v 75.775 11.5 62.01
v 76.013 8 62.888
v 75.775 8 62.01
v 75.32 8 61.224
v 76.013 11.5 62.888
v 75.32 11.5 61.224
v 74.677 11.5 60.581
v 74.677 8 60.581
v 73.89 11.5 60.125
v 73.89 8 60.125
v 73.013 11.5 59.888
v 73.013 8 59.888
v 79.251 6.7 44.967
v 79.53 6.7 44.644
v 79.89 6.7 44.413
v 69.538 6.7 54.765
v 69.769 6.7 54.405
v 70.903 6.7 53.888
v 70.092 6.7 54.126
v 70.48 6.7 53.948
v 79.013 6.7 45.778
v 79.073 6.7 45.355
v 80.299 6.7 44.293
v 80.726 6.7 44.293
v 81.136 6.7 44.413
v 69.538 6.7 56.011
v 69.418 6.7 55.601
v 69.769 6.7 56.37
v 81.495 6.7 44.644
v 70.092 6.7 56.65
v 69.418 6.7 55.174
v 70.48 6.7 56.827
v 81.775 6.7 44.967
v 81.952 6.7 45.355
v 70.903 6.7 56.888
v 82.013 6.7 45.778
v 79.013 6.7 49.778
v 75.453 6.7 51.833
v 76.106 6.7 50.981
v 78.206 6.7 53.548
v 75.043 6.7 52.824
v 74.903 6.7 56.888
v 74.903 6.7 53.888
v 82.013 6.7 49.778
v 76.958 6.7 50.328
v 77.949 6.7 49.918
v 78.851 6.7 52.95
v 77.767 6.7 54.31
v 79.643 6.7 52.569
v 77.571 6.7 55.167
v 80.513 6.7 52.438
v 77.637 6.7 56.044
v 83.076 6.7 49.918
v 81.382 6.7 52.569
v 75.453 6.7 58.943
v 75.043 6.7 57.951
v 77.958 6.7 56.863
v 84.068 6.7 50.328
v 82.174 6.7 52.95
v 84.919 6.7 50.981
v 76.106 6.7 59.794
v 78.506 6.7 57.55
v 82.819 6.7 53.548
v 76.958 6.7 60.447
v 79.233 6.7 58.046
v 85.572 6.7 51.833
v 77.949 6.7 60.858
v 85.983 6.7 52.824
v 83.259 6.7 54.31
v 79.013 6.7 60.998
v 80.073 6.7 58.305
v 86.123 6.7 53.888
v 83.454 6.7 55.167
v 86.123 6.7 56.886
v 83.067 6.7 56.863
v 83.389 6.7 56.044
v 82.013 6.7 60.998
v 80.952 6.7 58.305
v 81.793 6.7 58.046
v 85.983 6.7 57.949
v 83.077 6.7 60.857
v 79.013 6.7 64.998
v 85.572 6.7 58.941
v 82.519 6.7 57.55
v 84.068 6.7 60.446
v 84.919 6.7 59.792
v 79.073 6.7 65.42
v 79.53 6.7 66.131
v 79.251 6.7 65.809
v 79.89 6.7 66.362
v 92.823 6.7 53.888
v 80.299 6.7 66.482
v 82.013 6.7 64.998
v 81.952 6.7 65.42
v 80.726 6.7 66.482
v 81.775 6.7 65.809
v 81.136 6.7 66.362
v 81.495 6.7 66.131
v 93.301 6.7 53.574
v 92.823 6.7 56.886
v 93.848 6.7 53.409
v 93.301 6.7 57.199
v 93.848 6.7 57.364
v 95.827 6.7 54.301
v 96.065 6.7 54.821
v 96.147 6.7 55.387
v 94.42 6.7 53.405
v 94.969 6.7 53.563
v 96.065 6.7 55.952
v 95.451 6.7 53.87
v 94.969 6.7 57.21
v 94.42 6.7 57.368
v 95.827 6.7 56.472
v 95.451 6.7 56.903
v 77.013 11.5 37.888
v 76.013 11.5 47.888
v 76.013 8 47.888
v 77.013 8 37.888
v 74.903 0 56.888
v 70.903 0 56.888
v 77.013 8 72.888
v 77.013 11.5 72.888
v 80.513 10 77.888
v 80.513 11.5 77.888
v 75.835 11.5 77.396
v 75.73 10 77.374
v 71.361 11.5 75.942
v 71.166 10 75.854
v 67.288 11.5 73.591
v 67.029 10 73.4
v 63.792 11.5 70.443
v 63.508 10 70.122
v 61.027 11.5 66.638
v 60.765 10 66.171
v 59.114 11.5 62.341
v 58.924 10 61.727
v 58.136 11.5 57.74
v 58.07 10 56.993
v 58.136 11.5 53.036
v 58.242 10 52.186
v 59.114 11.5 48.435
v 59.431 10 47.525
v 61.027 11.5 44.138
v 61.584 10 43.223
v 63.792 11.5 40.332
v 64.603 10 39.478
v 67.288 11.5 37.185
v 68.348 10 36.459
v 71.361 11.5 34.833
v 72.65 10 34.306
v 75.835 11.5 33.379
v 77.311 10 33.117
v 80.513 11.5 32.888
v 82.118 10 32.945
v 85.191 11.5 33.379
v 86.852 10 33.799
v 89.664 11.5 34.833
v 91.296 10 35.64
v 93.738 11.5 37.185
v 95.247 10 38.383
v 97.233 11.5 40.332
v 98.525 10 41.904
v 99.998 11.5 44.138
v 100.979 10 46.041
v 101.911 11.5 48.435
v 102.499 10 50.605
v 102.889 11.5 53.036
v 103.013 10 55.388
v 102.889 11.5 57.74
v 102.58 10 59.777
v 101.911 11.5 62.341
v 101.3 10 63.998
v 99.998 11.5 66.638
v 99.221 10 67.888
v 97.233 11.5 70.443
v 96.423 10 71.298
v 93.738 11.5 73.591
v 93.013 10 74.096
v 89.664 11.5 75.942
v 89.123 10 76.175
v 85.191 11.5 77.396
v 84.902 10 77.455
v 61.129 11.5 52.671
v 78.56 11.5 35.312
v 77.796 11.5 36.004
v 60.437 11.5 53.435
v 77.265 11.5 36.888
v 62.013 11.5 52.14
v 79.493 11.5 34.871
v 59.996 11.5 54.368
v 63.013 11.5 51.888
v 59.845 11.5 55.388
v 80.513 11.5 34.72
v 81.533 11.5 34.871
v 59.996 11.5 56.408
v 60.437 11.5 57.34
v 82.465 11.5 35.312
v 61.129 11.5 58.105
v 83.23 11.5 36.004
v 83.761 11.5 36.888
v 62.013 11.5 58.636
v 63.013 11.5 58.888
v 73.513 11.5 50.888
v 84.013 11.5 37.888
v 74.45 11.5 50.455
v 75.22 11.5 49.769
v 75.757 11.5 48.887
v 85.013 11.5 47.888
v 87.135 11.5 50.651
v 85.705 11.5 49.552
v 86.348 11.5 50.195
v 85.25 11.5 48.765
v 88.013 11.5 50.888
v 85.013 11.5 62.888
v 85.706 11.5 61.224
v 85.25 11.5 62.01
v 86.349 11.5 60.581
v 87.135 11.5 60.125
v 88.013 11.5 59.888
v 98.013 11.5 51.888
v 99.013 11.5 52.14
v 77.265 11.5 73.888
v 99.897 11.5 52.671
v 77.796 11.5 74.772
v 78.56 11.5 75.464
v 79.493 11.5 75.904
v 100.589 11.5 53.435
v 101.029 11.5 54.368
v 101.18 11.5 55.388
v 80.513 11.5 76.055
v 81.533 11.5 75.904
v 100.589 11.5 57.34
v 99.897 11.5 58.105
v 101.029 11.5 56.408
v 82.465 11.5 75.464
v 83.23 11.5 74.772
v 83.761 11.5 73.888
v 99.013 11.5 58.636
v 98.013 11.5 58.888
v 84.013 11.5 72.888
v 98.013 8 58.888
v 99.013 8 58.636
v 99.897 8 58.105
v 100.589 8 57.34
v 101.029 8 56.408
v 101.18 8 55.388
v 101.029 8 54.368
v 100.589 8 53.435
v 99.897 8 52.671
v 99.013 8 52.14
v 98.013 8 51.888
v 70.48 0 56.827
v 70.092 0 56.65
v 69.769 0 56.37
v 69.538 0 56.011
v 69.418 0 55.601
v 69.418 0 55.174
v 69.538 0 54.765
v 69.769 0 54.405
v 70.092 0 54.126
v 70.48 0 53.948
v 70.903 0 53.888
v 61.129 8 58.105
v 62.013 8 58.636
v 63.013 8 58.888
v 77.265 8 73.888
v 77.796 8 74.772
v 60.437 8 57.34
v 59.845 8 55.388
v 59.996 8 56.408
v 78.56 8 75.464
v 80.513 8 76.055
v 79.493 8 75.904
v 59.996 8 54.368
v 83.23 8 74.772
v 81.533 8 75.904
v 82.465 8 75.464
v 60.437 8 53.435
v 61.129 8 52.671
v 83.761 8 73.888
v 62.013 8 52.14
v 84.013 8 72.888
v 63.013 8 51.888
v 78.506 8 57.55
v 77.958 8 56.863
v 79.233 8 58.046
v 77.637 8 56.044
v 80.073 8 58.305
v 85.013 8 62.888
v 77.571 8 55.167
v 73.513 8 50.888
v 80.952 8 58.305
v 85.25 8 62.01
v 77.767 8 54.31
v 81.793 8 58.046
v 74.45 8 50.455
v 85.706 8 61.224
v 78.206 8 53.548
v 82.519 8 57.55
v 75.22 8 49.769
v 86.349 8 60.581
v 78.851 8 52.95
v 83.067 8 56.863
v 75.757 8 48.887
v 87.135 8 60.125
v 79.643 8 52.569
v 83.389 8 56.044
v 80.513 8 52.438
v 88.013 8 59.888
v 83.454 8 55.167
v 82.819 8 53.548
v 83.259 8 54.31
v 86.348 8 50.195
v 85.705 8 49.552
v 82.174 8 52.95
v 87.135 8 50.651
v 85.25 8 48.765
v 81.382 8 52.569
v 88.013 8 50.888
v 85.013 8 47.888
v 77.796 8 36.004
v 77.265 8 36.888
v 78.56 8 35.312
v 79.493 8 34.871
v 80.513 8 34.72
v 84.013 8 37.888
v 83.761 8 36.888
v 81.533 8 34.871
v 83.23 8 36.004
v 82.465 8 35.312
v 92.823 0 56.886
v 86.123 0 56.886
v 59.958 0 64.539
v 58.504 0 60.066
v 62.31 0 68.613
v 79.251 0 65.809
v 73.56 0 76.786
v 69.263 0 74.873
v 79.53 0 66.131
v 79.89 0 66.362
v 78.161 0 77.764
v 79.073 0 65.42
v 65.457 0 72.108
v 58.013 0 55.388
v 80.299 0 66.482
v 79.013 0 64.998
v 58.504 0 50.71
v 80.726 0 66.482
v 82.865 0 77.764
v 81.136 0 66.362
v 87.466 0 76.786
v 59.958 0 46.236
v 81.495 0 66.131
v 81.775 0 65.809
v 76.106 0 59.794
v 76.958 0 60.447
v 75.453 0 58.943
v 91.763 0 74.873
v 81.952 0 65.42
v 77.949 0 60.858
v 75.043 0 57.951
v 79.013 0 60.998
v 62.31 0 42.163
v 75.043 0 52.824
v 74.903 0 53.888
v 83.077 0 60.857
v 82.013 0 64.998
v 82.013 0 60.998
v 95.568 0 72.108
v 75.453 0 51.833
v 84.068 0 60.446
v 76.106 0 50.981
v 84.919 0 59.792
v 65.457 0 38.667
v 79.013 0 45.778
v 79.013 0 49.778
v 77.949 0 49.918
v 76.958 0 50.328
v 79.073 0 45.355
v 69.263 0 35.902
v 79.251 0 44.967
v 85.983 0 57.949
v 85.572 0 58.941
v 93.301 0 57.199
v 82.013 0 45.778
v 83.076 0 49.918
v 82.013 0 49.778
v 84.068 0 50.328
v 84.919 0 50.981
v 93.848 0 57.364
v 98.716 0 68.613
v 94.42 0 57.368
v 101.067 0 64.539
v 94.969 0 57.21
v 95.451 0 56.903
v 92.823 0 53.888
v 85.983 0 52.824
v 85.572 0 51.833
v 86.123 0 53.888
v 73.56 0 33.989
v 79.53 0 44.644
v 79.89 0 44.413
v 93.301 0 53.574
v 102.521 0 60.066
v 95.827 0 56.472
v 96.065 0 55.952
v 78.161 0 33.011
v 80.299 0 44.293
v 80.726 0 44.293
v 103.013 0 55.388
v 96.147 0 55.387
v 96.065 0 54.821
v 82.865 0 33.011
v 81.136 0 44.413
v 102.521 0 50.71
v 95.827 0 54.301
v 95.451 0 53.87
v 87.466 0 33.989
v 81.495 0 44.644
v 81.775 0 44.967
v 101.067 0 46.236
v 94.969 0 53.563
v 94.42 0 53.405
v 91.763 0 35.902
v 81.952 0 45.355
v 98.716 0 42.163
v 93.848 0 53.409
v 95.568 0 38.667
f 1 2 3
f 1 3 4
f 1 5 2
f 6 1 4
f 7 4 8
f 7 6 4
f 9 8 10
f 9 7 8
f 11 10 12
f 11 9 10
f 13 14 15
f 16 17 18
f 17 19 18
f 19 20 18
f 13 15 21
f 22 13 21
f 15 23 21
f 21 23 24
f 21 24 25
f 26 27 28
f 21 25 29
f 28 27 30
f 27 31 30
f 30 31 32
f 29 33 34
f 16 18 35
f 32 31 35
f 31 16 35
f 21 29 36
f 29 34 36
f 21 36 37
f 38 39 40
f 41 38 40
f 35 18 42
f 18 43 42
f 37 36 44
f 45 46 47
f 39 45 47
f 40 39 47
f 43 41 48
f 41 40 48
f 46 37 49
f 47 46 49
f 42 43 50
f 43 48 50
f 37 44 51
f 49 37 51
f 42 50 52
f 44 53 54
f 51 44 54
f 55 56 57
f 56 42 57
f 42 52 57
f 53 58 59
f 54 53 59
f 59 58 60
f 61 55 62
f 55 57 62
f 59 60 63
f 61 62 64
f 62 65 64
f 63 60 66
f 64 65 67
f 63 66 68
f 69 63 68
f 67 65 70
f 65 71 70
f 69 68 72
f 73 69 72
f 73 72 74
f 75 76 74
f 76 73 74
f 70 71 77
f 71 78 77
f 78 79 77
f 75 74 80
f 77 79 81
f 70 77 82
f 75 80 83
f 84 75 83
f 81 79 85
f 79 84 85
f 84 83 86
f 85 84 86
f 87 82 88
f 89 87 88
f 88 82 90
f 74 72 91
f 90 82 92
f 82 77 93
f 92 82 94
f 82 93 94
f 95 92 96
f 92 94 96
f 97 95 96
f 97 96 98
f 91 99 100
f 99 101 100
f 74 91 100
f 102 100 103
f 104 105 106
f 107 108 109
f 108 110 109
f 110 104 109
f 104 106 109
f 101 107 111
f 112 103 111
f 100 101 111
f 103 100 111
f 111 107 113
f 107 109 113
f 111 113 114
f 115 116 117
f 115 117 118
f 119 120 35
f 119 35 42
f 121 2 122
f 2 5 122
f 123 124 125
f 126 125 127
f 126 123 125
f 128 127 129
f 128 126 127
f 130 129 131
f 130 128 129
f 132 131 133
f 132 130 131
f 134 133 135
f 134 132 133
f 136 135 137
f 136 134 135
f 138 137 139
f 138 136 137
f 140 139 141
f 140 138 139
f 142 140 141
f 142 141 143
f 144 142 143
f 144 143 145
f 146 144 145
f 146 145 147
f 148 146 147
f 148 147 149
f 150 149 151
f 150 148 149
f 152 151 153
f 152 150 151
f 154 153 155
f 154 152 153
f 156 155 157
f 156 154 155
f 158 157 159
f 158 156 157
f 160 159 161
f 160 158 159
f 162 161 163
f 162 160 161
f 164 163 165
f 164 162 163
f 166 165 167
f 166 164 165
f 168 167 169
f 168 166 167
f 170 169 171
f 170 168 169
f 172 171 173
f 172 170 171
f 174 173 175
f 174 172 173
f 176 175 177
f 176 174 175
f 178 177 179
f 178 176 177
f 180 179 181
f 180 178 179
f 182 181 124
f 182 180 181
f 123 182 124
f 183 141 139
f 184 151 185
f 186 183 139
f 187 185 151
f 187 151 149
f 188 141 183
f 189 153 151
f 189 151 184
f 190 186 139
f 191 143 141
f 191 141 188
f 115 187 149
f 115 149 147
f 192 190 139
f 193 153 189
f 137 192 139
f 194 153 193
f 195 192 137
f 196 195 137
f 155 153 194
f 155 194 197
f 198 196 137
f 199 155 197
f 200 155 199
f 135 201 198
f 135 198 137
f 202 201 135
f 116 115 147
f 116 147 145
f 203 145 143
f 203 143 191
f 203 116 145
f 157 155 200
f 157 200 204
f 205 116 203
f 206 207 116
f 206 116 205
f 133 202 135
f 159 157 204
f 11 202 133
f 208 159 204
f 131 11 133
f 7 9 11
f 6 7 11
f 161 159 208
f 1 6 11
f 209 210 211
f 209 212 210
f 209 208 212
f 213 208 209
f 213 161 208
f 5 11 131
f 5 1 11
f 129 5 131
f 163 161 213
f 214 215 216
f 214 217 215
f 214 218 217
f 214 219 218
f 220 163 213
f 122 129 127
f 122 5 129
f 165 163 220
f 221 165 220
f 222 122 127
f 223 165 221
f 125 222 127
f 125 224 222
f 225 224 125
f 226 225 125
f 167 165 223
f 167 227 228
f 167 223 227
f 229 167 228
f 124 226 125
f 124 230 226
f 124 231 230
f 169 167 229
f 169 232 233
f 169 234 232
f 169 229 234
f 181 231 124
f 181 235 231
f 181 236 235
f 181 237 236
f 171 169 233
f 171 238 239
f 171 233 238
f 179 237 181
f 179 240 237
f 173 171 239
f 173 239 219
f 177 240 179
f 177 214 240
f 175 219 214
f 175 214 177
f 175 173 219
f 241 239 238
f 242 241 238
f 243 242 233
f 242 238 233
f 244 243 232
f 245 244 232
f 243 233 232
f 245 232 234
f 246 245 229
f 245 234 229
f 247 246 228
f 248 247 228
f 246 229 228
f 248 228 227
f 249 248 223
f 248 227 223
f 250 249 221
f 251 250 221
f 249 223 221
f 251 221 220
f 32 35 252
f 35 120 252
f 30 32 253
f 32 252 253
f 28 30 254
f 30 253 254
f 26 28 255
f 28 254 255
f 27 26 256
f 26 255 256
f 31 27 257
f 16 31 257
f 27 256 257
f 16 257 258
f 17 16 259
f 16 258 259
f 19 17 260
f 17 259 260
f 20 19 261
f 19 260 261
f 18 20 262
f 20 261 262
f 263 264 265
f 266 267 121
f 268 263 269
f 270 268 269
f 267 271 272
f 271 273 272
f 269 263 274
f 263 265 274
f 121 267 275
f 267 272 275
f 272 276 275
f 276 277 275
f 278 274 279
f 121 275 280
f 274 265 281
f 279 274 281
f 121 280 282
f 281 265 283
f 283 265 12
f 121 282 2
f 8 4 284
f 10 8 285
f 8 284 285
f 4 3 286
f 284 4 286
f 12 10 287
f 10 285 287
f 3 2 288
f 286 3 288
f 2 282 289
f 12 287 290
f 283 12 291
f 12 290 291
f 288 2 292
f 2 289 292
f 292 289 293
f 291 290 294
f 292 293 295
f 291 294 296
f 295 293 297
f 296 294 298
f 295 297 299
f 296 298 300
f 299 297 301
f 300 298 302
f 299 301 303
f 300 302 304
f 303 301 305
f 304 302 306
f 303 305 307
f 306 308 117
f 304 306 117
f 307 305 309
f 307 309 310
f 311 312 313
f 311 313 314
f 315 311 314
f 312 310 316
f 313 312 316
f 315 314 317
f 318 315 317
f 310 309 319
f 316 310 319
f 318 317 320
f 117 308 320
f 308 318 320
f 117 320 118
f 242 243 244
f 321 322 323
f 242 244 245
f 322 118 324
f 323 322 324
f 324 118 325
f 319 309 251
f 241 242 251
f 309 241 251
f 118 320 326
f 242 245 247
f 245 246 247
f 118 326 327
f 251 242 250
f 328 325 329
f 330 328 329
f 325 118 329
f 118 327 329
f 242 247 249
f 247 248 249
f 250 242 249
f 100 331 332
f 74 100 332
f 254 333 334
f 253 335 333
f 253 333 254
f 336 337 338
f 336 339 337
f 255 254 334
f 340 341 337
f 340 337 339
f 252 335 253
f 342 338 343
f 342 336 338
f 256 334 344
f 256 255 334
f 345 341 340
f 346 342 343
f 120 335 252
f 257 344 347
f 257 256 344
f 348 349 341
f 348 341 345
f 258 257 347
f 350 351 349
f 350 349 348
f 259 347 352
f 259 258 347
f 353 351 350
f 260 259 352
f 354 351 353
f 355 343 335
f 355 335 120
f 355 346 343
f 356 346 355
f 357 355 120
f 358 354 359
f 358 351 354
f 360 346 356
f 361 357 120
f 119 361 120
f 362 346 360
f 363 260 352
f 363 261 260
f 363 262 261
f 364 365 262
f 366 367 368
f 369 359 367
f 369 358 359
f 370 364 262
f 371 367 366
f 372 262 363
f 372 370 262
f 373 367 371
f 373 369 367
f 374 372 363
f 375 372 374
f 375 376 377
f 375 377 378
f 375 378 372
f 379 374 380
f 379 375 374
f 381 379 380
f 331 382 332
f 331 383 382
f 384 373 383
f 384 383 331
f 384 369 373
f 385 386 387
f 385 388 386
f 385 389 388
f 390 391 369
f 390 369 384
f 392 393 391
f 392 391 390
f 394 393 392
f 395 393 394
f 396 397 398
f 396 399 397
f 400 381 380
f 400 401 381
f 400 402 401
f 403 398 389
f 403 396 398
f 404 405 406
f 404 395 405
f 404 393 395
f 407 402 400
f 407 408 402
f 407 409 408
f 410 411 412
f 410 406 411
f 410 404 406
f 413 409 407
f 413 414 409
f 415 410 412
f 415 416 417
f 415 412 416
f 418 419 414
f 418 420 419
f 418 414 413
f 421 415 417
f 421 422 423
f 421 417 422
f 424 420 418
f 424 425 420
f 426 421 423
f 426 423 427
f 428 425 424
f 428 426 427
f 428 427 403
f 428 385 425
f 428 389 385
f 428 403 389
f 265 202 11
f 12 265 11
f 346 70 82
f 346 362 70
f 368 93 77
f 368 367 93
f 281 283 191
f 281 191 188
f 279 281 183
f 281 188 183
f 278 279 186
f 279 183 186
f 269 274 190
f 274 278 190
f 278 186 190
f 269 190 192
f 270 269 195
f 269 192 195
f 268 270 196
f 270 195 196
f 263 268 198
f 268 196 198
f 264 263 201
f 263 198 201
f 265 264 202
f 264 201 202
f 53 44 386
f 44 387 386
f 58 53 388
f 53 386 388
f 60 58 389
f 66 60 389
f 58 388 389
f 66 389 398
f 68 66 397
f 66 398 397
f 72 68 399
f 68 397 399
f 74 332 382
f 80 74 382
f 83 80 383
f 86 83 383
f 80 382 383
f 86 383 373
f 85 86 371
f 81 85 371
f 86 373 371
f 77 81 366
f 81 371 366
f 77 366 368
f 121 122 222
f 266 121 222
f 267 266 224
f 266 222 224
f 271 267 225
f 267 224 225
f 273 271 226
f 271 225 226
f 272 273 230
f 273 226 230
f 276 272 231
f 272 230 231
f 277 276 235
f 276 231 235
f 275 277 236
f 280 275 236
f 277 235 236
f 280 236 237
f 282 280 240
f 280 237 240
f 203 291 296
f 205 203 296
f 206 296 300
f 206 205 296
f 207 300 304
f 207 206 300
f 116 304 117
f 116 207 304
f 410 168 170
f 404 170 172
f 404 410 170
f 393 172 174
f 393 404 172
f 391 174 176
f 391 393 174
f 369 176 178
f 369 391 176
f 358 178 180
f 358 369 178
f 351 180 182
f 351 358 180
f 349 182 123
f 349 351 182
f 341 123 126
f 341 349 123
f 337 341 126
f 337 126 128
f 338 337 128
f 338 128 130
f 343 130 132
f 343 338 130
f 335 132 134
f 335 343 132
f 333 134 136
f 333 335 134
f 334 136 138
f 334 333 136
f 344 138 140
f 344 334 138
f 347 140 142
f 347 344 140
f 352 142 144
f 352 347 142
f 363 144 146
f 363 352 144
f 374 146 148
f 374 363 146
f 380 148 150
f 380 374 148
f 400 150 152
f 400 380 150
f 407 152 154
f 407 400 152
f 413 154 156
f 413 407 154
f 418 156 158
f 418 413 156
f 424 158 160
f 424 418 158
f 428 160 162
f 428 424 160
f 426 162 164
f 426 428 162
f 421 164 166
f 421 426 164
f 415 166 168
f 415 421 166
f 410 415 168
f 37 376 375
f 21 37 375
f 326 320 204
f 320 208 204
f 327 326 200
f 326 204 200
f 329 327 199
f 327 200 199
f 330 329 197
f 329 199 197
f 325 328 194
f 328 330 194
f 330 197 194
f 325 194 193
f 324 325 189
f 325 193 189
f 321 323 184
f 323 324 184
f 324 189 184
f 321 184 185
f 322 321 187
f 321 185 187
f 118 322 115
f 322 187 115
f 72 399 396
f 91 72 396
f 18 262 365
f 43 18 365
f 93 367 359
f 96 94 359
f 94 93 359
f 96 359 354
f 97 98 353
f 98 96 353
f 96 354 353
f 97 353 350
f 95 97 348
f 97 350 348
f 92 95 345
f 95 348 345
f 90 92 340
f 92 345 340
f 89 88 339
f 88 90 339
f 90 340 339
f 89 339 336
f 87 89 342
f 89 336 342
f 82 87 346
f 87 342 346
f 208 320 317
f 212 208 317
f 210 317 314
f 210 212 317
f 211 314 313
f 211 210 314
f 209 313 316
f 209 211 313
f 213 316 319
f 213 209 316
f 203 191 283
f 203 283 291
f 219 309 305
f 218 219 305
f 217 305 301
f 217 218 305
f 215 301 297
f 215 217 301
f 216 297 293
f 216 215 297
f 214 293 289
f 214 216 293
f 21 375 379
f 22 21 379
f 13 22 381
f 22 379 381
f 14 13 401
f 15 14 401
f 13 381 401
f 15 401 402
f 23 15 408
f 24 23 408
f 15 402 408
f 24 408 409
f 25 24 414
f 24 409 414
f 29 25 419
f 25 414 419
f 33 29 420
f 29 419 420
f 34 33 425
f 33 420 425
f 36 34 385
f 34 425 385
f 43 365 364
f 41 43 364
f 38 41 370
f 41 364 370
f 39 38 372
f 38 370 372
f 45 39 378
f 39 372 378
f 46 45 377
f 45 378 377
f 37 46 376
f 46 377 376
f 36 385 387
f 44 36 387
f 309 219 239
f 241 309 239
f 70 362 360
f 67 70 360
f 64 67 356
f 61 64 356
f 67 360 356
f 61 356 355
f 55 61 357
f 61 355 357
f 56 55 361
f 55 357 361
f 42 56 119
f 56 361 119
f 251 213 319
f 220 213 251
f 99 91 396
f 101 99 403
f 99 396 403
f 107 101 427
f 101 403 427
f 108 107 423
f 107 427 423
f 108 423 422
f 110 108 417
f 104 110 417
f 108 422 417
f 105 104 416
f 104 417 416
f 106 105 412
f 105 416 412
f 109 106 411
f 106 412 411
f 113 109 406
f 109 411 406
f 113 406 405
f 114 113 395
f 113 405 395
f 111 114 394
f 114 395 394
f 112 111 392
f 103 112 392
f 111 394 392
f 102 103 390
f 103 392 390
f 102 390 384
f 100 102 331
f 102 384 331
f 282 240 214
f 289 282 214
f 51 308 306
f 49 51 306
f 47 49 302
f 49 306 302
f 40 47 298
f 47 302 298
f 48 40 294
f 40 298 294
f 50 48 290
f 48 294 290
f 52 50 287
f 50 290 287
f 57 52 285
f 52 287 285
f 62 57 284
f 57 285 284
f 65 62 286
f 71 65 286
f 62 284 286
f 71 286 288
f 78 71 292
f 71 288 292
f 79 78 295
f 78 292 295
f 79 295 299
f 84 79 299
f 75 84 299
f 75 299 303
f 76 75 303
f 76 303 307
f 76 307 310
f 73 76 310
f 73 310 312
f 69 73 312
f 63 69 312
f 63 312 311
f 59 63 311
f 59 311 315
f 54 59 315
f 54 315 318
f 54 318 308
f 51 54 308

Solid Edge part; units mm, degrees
sketch "Sketch1" plane through (0, 0, 0) normal (0, -1, 0) x (1, 0, 0)
  circle A0 centre (80.5127, 55.3877) radius 22.5
  dimension "D1" = 45
extrude "Protrusion1" add sketch "Sketch1" against normal blind 10
sketch "Sketch2" plane through (80.5127, 10, 55.3877) normal (0, 1, 0) x (0, 0, -1)
  circle A0 centre (0, 0) radius 2.95
  dimension "D1" = 5.9
extrude "ExtrudedCutout_5" cut sketch "Sketch2" against normal blind 4
sketch "Sketch3" plane through (80.5127, 6, 55.3877) normal (0, 1, 0) x (-1, 0, 0)
  circle A0 centre (0, 0) radius 1.05
  dimension "D1" = 2.1
extrude "Cutout1" cut sketch "Sketch3" against normal up to next
sketch "Sketch4" plane through (80.5127, 5, 51.1598) normal (0, -1, 0) x (1, 0, 0)
  circle A0 centre (0, 4.2279) radius 3.55
extrude "ExtrudedCutout_7" cut sketch "Sketch4" against normal blind 0.5
chamfer "Chamfer_2" distance 1.9 distance2 0.5 1 edges at (80.5127, 6, 58.3377) measured on face at (78.605, 6, 53.362)
sketch "Sketch5" plane through (80.5127, 10, 55.3877) normal (0, 1, 0) x (0, 0, 1)
  circle A0 centre (0, 0) radius 22.5
  circle A1 centre (0, 0) radius 3
  dimension "D1" = 45
extrude "ExtrudedProtrusion_4" add sketch "Sketch5" along normal blind 1.5
sketch "Sketch6" plane through (80.5127, 0, 55.3877) normal (0, -1, 0) x (0, 0, 1)
  line L0 (1.5, 9.61) -> (1.5, 5.61)
  arc A0 (5.61, 1.5) -> (1.5, 5.61) centre (1.5, 1.5) ccw
  line L1 (5.61, 1.5) -> (9.61, 1.5)
  arc A1 (9.61, 1.5) -> (9.61, -1.5) centre (9.61, 0) cw
  line L2 (9.61, -1.5) -> (5.61, -1.5)
  arc A2 (1.4978, -5.61) -> (5.61, -1.5) centre (1.4978, -1.4978) ccw
  line L3 (1.4978, -12.31) -> (1.4978, -5.61)
  arc A3 (-1.5, -12.31) -> (1.4978, -12.31) centre (-0.0011, -13.6341) ccw
  line L4 (-1.5, -5.61) -> (-1.5, -12.31)
  arc A4 (-5.61, -1.5) -> (-1.5, -5.61) centre (-1.5, -1.5) ccw
  line L5 (-9.61, -1.5) -> (-5.61, -1.5)
  arc A5 (-9.61, 1.5) -> (-9.61, -1.5) centre (-9.61, 0) ccw
  line L6 (-5.61, 1.5) -> (-9.61, 1.5)
  arc A6 (-5.61, 1.5) -> (-1.5, 5.61) centre (-1.5, 1.5) cw
  line L7 (-1.5, 9.61) -> (-1.5, 5.61)
  arc A7 (1.5, 9.61) -> (-1.5, 9.61) centre (0, 9.61) ccw
  dimension "D1" = 4
  dimension "D2" = 5.61
  dimension "D3" = 1.5
  dimension "D4" = 1.5
  dimension "D5" = 4
  dimension "D6" = 4
  dimension "D7" = 1.5
  dimension "D8" = 4
  dimension "D9" = 4
  dimension "D10" = 1.5
  dimension "D11" = 5.61
  dimension "D12" = 5.61
  dimension "D13" = 6.7
  dimension "D14" = 5.61
  dimension "D15" = 1.5
  dimension "D16" = 6.7
  dimension "D17" = 4
  dimension "D18" = 2
extrude "ExtrudedCutout_9" cut sketch "Sketch6" against normal blind 6.7
sketch "Sketch7" plane through (80.5127, 11.5, 55.3877) normal (0, 1, 0) x (0, 0, -1)
  arc A0 (-7.5, 4.5) -> (-4.5, 7.5) centre (-7.9685, 7.9685) ccw
  line L0 (-3.5, 17.5) -> (-4.5, 7.5)
  arc A1 (-3.5, 17.5) -> (3.5, 17.5) centre (0, 17.15) cw
  line L1 (3.5, 17.5) -> (4.5, 7)
  arc A2 (4.5, 7) -> (7.5, 4.5) centre (7.8596, 7.9815) ccw
  line L2 (7.5, 4.5) -> (17.5, 3.5)
  arc A3 (17.5, 3.5) -> (17.5, -3.5) centre (17.15, 0) cw
  line L3 (7.5, -4.5) -> (17.5, -3.5)
  arc A4 (4.5, -7.5) -> (7.5, -4.5) centre (7.9657, -7.9657) cw
  line L4 (4.5, -7.5) -> (3.5, -17.5)
  arc A5 (-3.5, -17.5) -> (3.5, -17.5) centre (0, -17.15) ccw
  line L5 (-4.5, -7.5) -> (-3.5, -17.5)
  arc A6 (-7.5, -4.5) -> (-4.5, -7.5) centre (-7.9685, -7.9685) cw
  line L6 (-17.5, -3.5) -> (-7.5, -4.5)
  arc A7 (-17.5, 3.5) -> (-17.5, -3.5) centre (-17.15, 0) ccw
  line L7 (-7.5, 4.5) -> (-17.5, 3.5)
extrude "ExtrudedCutout_10" cut sketch "Sketch7" against normal blind 3.5
